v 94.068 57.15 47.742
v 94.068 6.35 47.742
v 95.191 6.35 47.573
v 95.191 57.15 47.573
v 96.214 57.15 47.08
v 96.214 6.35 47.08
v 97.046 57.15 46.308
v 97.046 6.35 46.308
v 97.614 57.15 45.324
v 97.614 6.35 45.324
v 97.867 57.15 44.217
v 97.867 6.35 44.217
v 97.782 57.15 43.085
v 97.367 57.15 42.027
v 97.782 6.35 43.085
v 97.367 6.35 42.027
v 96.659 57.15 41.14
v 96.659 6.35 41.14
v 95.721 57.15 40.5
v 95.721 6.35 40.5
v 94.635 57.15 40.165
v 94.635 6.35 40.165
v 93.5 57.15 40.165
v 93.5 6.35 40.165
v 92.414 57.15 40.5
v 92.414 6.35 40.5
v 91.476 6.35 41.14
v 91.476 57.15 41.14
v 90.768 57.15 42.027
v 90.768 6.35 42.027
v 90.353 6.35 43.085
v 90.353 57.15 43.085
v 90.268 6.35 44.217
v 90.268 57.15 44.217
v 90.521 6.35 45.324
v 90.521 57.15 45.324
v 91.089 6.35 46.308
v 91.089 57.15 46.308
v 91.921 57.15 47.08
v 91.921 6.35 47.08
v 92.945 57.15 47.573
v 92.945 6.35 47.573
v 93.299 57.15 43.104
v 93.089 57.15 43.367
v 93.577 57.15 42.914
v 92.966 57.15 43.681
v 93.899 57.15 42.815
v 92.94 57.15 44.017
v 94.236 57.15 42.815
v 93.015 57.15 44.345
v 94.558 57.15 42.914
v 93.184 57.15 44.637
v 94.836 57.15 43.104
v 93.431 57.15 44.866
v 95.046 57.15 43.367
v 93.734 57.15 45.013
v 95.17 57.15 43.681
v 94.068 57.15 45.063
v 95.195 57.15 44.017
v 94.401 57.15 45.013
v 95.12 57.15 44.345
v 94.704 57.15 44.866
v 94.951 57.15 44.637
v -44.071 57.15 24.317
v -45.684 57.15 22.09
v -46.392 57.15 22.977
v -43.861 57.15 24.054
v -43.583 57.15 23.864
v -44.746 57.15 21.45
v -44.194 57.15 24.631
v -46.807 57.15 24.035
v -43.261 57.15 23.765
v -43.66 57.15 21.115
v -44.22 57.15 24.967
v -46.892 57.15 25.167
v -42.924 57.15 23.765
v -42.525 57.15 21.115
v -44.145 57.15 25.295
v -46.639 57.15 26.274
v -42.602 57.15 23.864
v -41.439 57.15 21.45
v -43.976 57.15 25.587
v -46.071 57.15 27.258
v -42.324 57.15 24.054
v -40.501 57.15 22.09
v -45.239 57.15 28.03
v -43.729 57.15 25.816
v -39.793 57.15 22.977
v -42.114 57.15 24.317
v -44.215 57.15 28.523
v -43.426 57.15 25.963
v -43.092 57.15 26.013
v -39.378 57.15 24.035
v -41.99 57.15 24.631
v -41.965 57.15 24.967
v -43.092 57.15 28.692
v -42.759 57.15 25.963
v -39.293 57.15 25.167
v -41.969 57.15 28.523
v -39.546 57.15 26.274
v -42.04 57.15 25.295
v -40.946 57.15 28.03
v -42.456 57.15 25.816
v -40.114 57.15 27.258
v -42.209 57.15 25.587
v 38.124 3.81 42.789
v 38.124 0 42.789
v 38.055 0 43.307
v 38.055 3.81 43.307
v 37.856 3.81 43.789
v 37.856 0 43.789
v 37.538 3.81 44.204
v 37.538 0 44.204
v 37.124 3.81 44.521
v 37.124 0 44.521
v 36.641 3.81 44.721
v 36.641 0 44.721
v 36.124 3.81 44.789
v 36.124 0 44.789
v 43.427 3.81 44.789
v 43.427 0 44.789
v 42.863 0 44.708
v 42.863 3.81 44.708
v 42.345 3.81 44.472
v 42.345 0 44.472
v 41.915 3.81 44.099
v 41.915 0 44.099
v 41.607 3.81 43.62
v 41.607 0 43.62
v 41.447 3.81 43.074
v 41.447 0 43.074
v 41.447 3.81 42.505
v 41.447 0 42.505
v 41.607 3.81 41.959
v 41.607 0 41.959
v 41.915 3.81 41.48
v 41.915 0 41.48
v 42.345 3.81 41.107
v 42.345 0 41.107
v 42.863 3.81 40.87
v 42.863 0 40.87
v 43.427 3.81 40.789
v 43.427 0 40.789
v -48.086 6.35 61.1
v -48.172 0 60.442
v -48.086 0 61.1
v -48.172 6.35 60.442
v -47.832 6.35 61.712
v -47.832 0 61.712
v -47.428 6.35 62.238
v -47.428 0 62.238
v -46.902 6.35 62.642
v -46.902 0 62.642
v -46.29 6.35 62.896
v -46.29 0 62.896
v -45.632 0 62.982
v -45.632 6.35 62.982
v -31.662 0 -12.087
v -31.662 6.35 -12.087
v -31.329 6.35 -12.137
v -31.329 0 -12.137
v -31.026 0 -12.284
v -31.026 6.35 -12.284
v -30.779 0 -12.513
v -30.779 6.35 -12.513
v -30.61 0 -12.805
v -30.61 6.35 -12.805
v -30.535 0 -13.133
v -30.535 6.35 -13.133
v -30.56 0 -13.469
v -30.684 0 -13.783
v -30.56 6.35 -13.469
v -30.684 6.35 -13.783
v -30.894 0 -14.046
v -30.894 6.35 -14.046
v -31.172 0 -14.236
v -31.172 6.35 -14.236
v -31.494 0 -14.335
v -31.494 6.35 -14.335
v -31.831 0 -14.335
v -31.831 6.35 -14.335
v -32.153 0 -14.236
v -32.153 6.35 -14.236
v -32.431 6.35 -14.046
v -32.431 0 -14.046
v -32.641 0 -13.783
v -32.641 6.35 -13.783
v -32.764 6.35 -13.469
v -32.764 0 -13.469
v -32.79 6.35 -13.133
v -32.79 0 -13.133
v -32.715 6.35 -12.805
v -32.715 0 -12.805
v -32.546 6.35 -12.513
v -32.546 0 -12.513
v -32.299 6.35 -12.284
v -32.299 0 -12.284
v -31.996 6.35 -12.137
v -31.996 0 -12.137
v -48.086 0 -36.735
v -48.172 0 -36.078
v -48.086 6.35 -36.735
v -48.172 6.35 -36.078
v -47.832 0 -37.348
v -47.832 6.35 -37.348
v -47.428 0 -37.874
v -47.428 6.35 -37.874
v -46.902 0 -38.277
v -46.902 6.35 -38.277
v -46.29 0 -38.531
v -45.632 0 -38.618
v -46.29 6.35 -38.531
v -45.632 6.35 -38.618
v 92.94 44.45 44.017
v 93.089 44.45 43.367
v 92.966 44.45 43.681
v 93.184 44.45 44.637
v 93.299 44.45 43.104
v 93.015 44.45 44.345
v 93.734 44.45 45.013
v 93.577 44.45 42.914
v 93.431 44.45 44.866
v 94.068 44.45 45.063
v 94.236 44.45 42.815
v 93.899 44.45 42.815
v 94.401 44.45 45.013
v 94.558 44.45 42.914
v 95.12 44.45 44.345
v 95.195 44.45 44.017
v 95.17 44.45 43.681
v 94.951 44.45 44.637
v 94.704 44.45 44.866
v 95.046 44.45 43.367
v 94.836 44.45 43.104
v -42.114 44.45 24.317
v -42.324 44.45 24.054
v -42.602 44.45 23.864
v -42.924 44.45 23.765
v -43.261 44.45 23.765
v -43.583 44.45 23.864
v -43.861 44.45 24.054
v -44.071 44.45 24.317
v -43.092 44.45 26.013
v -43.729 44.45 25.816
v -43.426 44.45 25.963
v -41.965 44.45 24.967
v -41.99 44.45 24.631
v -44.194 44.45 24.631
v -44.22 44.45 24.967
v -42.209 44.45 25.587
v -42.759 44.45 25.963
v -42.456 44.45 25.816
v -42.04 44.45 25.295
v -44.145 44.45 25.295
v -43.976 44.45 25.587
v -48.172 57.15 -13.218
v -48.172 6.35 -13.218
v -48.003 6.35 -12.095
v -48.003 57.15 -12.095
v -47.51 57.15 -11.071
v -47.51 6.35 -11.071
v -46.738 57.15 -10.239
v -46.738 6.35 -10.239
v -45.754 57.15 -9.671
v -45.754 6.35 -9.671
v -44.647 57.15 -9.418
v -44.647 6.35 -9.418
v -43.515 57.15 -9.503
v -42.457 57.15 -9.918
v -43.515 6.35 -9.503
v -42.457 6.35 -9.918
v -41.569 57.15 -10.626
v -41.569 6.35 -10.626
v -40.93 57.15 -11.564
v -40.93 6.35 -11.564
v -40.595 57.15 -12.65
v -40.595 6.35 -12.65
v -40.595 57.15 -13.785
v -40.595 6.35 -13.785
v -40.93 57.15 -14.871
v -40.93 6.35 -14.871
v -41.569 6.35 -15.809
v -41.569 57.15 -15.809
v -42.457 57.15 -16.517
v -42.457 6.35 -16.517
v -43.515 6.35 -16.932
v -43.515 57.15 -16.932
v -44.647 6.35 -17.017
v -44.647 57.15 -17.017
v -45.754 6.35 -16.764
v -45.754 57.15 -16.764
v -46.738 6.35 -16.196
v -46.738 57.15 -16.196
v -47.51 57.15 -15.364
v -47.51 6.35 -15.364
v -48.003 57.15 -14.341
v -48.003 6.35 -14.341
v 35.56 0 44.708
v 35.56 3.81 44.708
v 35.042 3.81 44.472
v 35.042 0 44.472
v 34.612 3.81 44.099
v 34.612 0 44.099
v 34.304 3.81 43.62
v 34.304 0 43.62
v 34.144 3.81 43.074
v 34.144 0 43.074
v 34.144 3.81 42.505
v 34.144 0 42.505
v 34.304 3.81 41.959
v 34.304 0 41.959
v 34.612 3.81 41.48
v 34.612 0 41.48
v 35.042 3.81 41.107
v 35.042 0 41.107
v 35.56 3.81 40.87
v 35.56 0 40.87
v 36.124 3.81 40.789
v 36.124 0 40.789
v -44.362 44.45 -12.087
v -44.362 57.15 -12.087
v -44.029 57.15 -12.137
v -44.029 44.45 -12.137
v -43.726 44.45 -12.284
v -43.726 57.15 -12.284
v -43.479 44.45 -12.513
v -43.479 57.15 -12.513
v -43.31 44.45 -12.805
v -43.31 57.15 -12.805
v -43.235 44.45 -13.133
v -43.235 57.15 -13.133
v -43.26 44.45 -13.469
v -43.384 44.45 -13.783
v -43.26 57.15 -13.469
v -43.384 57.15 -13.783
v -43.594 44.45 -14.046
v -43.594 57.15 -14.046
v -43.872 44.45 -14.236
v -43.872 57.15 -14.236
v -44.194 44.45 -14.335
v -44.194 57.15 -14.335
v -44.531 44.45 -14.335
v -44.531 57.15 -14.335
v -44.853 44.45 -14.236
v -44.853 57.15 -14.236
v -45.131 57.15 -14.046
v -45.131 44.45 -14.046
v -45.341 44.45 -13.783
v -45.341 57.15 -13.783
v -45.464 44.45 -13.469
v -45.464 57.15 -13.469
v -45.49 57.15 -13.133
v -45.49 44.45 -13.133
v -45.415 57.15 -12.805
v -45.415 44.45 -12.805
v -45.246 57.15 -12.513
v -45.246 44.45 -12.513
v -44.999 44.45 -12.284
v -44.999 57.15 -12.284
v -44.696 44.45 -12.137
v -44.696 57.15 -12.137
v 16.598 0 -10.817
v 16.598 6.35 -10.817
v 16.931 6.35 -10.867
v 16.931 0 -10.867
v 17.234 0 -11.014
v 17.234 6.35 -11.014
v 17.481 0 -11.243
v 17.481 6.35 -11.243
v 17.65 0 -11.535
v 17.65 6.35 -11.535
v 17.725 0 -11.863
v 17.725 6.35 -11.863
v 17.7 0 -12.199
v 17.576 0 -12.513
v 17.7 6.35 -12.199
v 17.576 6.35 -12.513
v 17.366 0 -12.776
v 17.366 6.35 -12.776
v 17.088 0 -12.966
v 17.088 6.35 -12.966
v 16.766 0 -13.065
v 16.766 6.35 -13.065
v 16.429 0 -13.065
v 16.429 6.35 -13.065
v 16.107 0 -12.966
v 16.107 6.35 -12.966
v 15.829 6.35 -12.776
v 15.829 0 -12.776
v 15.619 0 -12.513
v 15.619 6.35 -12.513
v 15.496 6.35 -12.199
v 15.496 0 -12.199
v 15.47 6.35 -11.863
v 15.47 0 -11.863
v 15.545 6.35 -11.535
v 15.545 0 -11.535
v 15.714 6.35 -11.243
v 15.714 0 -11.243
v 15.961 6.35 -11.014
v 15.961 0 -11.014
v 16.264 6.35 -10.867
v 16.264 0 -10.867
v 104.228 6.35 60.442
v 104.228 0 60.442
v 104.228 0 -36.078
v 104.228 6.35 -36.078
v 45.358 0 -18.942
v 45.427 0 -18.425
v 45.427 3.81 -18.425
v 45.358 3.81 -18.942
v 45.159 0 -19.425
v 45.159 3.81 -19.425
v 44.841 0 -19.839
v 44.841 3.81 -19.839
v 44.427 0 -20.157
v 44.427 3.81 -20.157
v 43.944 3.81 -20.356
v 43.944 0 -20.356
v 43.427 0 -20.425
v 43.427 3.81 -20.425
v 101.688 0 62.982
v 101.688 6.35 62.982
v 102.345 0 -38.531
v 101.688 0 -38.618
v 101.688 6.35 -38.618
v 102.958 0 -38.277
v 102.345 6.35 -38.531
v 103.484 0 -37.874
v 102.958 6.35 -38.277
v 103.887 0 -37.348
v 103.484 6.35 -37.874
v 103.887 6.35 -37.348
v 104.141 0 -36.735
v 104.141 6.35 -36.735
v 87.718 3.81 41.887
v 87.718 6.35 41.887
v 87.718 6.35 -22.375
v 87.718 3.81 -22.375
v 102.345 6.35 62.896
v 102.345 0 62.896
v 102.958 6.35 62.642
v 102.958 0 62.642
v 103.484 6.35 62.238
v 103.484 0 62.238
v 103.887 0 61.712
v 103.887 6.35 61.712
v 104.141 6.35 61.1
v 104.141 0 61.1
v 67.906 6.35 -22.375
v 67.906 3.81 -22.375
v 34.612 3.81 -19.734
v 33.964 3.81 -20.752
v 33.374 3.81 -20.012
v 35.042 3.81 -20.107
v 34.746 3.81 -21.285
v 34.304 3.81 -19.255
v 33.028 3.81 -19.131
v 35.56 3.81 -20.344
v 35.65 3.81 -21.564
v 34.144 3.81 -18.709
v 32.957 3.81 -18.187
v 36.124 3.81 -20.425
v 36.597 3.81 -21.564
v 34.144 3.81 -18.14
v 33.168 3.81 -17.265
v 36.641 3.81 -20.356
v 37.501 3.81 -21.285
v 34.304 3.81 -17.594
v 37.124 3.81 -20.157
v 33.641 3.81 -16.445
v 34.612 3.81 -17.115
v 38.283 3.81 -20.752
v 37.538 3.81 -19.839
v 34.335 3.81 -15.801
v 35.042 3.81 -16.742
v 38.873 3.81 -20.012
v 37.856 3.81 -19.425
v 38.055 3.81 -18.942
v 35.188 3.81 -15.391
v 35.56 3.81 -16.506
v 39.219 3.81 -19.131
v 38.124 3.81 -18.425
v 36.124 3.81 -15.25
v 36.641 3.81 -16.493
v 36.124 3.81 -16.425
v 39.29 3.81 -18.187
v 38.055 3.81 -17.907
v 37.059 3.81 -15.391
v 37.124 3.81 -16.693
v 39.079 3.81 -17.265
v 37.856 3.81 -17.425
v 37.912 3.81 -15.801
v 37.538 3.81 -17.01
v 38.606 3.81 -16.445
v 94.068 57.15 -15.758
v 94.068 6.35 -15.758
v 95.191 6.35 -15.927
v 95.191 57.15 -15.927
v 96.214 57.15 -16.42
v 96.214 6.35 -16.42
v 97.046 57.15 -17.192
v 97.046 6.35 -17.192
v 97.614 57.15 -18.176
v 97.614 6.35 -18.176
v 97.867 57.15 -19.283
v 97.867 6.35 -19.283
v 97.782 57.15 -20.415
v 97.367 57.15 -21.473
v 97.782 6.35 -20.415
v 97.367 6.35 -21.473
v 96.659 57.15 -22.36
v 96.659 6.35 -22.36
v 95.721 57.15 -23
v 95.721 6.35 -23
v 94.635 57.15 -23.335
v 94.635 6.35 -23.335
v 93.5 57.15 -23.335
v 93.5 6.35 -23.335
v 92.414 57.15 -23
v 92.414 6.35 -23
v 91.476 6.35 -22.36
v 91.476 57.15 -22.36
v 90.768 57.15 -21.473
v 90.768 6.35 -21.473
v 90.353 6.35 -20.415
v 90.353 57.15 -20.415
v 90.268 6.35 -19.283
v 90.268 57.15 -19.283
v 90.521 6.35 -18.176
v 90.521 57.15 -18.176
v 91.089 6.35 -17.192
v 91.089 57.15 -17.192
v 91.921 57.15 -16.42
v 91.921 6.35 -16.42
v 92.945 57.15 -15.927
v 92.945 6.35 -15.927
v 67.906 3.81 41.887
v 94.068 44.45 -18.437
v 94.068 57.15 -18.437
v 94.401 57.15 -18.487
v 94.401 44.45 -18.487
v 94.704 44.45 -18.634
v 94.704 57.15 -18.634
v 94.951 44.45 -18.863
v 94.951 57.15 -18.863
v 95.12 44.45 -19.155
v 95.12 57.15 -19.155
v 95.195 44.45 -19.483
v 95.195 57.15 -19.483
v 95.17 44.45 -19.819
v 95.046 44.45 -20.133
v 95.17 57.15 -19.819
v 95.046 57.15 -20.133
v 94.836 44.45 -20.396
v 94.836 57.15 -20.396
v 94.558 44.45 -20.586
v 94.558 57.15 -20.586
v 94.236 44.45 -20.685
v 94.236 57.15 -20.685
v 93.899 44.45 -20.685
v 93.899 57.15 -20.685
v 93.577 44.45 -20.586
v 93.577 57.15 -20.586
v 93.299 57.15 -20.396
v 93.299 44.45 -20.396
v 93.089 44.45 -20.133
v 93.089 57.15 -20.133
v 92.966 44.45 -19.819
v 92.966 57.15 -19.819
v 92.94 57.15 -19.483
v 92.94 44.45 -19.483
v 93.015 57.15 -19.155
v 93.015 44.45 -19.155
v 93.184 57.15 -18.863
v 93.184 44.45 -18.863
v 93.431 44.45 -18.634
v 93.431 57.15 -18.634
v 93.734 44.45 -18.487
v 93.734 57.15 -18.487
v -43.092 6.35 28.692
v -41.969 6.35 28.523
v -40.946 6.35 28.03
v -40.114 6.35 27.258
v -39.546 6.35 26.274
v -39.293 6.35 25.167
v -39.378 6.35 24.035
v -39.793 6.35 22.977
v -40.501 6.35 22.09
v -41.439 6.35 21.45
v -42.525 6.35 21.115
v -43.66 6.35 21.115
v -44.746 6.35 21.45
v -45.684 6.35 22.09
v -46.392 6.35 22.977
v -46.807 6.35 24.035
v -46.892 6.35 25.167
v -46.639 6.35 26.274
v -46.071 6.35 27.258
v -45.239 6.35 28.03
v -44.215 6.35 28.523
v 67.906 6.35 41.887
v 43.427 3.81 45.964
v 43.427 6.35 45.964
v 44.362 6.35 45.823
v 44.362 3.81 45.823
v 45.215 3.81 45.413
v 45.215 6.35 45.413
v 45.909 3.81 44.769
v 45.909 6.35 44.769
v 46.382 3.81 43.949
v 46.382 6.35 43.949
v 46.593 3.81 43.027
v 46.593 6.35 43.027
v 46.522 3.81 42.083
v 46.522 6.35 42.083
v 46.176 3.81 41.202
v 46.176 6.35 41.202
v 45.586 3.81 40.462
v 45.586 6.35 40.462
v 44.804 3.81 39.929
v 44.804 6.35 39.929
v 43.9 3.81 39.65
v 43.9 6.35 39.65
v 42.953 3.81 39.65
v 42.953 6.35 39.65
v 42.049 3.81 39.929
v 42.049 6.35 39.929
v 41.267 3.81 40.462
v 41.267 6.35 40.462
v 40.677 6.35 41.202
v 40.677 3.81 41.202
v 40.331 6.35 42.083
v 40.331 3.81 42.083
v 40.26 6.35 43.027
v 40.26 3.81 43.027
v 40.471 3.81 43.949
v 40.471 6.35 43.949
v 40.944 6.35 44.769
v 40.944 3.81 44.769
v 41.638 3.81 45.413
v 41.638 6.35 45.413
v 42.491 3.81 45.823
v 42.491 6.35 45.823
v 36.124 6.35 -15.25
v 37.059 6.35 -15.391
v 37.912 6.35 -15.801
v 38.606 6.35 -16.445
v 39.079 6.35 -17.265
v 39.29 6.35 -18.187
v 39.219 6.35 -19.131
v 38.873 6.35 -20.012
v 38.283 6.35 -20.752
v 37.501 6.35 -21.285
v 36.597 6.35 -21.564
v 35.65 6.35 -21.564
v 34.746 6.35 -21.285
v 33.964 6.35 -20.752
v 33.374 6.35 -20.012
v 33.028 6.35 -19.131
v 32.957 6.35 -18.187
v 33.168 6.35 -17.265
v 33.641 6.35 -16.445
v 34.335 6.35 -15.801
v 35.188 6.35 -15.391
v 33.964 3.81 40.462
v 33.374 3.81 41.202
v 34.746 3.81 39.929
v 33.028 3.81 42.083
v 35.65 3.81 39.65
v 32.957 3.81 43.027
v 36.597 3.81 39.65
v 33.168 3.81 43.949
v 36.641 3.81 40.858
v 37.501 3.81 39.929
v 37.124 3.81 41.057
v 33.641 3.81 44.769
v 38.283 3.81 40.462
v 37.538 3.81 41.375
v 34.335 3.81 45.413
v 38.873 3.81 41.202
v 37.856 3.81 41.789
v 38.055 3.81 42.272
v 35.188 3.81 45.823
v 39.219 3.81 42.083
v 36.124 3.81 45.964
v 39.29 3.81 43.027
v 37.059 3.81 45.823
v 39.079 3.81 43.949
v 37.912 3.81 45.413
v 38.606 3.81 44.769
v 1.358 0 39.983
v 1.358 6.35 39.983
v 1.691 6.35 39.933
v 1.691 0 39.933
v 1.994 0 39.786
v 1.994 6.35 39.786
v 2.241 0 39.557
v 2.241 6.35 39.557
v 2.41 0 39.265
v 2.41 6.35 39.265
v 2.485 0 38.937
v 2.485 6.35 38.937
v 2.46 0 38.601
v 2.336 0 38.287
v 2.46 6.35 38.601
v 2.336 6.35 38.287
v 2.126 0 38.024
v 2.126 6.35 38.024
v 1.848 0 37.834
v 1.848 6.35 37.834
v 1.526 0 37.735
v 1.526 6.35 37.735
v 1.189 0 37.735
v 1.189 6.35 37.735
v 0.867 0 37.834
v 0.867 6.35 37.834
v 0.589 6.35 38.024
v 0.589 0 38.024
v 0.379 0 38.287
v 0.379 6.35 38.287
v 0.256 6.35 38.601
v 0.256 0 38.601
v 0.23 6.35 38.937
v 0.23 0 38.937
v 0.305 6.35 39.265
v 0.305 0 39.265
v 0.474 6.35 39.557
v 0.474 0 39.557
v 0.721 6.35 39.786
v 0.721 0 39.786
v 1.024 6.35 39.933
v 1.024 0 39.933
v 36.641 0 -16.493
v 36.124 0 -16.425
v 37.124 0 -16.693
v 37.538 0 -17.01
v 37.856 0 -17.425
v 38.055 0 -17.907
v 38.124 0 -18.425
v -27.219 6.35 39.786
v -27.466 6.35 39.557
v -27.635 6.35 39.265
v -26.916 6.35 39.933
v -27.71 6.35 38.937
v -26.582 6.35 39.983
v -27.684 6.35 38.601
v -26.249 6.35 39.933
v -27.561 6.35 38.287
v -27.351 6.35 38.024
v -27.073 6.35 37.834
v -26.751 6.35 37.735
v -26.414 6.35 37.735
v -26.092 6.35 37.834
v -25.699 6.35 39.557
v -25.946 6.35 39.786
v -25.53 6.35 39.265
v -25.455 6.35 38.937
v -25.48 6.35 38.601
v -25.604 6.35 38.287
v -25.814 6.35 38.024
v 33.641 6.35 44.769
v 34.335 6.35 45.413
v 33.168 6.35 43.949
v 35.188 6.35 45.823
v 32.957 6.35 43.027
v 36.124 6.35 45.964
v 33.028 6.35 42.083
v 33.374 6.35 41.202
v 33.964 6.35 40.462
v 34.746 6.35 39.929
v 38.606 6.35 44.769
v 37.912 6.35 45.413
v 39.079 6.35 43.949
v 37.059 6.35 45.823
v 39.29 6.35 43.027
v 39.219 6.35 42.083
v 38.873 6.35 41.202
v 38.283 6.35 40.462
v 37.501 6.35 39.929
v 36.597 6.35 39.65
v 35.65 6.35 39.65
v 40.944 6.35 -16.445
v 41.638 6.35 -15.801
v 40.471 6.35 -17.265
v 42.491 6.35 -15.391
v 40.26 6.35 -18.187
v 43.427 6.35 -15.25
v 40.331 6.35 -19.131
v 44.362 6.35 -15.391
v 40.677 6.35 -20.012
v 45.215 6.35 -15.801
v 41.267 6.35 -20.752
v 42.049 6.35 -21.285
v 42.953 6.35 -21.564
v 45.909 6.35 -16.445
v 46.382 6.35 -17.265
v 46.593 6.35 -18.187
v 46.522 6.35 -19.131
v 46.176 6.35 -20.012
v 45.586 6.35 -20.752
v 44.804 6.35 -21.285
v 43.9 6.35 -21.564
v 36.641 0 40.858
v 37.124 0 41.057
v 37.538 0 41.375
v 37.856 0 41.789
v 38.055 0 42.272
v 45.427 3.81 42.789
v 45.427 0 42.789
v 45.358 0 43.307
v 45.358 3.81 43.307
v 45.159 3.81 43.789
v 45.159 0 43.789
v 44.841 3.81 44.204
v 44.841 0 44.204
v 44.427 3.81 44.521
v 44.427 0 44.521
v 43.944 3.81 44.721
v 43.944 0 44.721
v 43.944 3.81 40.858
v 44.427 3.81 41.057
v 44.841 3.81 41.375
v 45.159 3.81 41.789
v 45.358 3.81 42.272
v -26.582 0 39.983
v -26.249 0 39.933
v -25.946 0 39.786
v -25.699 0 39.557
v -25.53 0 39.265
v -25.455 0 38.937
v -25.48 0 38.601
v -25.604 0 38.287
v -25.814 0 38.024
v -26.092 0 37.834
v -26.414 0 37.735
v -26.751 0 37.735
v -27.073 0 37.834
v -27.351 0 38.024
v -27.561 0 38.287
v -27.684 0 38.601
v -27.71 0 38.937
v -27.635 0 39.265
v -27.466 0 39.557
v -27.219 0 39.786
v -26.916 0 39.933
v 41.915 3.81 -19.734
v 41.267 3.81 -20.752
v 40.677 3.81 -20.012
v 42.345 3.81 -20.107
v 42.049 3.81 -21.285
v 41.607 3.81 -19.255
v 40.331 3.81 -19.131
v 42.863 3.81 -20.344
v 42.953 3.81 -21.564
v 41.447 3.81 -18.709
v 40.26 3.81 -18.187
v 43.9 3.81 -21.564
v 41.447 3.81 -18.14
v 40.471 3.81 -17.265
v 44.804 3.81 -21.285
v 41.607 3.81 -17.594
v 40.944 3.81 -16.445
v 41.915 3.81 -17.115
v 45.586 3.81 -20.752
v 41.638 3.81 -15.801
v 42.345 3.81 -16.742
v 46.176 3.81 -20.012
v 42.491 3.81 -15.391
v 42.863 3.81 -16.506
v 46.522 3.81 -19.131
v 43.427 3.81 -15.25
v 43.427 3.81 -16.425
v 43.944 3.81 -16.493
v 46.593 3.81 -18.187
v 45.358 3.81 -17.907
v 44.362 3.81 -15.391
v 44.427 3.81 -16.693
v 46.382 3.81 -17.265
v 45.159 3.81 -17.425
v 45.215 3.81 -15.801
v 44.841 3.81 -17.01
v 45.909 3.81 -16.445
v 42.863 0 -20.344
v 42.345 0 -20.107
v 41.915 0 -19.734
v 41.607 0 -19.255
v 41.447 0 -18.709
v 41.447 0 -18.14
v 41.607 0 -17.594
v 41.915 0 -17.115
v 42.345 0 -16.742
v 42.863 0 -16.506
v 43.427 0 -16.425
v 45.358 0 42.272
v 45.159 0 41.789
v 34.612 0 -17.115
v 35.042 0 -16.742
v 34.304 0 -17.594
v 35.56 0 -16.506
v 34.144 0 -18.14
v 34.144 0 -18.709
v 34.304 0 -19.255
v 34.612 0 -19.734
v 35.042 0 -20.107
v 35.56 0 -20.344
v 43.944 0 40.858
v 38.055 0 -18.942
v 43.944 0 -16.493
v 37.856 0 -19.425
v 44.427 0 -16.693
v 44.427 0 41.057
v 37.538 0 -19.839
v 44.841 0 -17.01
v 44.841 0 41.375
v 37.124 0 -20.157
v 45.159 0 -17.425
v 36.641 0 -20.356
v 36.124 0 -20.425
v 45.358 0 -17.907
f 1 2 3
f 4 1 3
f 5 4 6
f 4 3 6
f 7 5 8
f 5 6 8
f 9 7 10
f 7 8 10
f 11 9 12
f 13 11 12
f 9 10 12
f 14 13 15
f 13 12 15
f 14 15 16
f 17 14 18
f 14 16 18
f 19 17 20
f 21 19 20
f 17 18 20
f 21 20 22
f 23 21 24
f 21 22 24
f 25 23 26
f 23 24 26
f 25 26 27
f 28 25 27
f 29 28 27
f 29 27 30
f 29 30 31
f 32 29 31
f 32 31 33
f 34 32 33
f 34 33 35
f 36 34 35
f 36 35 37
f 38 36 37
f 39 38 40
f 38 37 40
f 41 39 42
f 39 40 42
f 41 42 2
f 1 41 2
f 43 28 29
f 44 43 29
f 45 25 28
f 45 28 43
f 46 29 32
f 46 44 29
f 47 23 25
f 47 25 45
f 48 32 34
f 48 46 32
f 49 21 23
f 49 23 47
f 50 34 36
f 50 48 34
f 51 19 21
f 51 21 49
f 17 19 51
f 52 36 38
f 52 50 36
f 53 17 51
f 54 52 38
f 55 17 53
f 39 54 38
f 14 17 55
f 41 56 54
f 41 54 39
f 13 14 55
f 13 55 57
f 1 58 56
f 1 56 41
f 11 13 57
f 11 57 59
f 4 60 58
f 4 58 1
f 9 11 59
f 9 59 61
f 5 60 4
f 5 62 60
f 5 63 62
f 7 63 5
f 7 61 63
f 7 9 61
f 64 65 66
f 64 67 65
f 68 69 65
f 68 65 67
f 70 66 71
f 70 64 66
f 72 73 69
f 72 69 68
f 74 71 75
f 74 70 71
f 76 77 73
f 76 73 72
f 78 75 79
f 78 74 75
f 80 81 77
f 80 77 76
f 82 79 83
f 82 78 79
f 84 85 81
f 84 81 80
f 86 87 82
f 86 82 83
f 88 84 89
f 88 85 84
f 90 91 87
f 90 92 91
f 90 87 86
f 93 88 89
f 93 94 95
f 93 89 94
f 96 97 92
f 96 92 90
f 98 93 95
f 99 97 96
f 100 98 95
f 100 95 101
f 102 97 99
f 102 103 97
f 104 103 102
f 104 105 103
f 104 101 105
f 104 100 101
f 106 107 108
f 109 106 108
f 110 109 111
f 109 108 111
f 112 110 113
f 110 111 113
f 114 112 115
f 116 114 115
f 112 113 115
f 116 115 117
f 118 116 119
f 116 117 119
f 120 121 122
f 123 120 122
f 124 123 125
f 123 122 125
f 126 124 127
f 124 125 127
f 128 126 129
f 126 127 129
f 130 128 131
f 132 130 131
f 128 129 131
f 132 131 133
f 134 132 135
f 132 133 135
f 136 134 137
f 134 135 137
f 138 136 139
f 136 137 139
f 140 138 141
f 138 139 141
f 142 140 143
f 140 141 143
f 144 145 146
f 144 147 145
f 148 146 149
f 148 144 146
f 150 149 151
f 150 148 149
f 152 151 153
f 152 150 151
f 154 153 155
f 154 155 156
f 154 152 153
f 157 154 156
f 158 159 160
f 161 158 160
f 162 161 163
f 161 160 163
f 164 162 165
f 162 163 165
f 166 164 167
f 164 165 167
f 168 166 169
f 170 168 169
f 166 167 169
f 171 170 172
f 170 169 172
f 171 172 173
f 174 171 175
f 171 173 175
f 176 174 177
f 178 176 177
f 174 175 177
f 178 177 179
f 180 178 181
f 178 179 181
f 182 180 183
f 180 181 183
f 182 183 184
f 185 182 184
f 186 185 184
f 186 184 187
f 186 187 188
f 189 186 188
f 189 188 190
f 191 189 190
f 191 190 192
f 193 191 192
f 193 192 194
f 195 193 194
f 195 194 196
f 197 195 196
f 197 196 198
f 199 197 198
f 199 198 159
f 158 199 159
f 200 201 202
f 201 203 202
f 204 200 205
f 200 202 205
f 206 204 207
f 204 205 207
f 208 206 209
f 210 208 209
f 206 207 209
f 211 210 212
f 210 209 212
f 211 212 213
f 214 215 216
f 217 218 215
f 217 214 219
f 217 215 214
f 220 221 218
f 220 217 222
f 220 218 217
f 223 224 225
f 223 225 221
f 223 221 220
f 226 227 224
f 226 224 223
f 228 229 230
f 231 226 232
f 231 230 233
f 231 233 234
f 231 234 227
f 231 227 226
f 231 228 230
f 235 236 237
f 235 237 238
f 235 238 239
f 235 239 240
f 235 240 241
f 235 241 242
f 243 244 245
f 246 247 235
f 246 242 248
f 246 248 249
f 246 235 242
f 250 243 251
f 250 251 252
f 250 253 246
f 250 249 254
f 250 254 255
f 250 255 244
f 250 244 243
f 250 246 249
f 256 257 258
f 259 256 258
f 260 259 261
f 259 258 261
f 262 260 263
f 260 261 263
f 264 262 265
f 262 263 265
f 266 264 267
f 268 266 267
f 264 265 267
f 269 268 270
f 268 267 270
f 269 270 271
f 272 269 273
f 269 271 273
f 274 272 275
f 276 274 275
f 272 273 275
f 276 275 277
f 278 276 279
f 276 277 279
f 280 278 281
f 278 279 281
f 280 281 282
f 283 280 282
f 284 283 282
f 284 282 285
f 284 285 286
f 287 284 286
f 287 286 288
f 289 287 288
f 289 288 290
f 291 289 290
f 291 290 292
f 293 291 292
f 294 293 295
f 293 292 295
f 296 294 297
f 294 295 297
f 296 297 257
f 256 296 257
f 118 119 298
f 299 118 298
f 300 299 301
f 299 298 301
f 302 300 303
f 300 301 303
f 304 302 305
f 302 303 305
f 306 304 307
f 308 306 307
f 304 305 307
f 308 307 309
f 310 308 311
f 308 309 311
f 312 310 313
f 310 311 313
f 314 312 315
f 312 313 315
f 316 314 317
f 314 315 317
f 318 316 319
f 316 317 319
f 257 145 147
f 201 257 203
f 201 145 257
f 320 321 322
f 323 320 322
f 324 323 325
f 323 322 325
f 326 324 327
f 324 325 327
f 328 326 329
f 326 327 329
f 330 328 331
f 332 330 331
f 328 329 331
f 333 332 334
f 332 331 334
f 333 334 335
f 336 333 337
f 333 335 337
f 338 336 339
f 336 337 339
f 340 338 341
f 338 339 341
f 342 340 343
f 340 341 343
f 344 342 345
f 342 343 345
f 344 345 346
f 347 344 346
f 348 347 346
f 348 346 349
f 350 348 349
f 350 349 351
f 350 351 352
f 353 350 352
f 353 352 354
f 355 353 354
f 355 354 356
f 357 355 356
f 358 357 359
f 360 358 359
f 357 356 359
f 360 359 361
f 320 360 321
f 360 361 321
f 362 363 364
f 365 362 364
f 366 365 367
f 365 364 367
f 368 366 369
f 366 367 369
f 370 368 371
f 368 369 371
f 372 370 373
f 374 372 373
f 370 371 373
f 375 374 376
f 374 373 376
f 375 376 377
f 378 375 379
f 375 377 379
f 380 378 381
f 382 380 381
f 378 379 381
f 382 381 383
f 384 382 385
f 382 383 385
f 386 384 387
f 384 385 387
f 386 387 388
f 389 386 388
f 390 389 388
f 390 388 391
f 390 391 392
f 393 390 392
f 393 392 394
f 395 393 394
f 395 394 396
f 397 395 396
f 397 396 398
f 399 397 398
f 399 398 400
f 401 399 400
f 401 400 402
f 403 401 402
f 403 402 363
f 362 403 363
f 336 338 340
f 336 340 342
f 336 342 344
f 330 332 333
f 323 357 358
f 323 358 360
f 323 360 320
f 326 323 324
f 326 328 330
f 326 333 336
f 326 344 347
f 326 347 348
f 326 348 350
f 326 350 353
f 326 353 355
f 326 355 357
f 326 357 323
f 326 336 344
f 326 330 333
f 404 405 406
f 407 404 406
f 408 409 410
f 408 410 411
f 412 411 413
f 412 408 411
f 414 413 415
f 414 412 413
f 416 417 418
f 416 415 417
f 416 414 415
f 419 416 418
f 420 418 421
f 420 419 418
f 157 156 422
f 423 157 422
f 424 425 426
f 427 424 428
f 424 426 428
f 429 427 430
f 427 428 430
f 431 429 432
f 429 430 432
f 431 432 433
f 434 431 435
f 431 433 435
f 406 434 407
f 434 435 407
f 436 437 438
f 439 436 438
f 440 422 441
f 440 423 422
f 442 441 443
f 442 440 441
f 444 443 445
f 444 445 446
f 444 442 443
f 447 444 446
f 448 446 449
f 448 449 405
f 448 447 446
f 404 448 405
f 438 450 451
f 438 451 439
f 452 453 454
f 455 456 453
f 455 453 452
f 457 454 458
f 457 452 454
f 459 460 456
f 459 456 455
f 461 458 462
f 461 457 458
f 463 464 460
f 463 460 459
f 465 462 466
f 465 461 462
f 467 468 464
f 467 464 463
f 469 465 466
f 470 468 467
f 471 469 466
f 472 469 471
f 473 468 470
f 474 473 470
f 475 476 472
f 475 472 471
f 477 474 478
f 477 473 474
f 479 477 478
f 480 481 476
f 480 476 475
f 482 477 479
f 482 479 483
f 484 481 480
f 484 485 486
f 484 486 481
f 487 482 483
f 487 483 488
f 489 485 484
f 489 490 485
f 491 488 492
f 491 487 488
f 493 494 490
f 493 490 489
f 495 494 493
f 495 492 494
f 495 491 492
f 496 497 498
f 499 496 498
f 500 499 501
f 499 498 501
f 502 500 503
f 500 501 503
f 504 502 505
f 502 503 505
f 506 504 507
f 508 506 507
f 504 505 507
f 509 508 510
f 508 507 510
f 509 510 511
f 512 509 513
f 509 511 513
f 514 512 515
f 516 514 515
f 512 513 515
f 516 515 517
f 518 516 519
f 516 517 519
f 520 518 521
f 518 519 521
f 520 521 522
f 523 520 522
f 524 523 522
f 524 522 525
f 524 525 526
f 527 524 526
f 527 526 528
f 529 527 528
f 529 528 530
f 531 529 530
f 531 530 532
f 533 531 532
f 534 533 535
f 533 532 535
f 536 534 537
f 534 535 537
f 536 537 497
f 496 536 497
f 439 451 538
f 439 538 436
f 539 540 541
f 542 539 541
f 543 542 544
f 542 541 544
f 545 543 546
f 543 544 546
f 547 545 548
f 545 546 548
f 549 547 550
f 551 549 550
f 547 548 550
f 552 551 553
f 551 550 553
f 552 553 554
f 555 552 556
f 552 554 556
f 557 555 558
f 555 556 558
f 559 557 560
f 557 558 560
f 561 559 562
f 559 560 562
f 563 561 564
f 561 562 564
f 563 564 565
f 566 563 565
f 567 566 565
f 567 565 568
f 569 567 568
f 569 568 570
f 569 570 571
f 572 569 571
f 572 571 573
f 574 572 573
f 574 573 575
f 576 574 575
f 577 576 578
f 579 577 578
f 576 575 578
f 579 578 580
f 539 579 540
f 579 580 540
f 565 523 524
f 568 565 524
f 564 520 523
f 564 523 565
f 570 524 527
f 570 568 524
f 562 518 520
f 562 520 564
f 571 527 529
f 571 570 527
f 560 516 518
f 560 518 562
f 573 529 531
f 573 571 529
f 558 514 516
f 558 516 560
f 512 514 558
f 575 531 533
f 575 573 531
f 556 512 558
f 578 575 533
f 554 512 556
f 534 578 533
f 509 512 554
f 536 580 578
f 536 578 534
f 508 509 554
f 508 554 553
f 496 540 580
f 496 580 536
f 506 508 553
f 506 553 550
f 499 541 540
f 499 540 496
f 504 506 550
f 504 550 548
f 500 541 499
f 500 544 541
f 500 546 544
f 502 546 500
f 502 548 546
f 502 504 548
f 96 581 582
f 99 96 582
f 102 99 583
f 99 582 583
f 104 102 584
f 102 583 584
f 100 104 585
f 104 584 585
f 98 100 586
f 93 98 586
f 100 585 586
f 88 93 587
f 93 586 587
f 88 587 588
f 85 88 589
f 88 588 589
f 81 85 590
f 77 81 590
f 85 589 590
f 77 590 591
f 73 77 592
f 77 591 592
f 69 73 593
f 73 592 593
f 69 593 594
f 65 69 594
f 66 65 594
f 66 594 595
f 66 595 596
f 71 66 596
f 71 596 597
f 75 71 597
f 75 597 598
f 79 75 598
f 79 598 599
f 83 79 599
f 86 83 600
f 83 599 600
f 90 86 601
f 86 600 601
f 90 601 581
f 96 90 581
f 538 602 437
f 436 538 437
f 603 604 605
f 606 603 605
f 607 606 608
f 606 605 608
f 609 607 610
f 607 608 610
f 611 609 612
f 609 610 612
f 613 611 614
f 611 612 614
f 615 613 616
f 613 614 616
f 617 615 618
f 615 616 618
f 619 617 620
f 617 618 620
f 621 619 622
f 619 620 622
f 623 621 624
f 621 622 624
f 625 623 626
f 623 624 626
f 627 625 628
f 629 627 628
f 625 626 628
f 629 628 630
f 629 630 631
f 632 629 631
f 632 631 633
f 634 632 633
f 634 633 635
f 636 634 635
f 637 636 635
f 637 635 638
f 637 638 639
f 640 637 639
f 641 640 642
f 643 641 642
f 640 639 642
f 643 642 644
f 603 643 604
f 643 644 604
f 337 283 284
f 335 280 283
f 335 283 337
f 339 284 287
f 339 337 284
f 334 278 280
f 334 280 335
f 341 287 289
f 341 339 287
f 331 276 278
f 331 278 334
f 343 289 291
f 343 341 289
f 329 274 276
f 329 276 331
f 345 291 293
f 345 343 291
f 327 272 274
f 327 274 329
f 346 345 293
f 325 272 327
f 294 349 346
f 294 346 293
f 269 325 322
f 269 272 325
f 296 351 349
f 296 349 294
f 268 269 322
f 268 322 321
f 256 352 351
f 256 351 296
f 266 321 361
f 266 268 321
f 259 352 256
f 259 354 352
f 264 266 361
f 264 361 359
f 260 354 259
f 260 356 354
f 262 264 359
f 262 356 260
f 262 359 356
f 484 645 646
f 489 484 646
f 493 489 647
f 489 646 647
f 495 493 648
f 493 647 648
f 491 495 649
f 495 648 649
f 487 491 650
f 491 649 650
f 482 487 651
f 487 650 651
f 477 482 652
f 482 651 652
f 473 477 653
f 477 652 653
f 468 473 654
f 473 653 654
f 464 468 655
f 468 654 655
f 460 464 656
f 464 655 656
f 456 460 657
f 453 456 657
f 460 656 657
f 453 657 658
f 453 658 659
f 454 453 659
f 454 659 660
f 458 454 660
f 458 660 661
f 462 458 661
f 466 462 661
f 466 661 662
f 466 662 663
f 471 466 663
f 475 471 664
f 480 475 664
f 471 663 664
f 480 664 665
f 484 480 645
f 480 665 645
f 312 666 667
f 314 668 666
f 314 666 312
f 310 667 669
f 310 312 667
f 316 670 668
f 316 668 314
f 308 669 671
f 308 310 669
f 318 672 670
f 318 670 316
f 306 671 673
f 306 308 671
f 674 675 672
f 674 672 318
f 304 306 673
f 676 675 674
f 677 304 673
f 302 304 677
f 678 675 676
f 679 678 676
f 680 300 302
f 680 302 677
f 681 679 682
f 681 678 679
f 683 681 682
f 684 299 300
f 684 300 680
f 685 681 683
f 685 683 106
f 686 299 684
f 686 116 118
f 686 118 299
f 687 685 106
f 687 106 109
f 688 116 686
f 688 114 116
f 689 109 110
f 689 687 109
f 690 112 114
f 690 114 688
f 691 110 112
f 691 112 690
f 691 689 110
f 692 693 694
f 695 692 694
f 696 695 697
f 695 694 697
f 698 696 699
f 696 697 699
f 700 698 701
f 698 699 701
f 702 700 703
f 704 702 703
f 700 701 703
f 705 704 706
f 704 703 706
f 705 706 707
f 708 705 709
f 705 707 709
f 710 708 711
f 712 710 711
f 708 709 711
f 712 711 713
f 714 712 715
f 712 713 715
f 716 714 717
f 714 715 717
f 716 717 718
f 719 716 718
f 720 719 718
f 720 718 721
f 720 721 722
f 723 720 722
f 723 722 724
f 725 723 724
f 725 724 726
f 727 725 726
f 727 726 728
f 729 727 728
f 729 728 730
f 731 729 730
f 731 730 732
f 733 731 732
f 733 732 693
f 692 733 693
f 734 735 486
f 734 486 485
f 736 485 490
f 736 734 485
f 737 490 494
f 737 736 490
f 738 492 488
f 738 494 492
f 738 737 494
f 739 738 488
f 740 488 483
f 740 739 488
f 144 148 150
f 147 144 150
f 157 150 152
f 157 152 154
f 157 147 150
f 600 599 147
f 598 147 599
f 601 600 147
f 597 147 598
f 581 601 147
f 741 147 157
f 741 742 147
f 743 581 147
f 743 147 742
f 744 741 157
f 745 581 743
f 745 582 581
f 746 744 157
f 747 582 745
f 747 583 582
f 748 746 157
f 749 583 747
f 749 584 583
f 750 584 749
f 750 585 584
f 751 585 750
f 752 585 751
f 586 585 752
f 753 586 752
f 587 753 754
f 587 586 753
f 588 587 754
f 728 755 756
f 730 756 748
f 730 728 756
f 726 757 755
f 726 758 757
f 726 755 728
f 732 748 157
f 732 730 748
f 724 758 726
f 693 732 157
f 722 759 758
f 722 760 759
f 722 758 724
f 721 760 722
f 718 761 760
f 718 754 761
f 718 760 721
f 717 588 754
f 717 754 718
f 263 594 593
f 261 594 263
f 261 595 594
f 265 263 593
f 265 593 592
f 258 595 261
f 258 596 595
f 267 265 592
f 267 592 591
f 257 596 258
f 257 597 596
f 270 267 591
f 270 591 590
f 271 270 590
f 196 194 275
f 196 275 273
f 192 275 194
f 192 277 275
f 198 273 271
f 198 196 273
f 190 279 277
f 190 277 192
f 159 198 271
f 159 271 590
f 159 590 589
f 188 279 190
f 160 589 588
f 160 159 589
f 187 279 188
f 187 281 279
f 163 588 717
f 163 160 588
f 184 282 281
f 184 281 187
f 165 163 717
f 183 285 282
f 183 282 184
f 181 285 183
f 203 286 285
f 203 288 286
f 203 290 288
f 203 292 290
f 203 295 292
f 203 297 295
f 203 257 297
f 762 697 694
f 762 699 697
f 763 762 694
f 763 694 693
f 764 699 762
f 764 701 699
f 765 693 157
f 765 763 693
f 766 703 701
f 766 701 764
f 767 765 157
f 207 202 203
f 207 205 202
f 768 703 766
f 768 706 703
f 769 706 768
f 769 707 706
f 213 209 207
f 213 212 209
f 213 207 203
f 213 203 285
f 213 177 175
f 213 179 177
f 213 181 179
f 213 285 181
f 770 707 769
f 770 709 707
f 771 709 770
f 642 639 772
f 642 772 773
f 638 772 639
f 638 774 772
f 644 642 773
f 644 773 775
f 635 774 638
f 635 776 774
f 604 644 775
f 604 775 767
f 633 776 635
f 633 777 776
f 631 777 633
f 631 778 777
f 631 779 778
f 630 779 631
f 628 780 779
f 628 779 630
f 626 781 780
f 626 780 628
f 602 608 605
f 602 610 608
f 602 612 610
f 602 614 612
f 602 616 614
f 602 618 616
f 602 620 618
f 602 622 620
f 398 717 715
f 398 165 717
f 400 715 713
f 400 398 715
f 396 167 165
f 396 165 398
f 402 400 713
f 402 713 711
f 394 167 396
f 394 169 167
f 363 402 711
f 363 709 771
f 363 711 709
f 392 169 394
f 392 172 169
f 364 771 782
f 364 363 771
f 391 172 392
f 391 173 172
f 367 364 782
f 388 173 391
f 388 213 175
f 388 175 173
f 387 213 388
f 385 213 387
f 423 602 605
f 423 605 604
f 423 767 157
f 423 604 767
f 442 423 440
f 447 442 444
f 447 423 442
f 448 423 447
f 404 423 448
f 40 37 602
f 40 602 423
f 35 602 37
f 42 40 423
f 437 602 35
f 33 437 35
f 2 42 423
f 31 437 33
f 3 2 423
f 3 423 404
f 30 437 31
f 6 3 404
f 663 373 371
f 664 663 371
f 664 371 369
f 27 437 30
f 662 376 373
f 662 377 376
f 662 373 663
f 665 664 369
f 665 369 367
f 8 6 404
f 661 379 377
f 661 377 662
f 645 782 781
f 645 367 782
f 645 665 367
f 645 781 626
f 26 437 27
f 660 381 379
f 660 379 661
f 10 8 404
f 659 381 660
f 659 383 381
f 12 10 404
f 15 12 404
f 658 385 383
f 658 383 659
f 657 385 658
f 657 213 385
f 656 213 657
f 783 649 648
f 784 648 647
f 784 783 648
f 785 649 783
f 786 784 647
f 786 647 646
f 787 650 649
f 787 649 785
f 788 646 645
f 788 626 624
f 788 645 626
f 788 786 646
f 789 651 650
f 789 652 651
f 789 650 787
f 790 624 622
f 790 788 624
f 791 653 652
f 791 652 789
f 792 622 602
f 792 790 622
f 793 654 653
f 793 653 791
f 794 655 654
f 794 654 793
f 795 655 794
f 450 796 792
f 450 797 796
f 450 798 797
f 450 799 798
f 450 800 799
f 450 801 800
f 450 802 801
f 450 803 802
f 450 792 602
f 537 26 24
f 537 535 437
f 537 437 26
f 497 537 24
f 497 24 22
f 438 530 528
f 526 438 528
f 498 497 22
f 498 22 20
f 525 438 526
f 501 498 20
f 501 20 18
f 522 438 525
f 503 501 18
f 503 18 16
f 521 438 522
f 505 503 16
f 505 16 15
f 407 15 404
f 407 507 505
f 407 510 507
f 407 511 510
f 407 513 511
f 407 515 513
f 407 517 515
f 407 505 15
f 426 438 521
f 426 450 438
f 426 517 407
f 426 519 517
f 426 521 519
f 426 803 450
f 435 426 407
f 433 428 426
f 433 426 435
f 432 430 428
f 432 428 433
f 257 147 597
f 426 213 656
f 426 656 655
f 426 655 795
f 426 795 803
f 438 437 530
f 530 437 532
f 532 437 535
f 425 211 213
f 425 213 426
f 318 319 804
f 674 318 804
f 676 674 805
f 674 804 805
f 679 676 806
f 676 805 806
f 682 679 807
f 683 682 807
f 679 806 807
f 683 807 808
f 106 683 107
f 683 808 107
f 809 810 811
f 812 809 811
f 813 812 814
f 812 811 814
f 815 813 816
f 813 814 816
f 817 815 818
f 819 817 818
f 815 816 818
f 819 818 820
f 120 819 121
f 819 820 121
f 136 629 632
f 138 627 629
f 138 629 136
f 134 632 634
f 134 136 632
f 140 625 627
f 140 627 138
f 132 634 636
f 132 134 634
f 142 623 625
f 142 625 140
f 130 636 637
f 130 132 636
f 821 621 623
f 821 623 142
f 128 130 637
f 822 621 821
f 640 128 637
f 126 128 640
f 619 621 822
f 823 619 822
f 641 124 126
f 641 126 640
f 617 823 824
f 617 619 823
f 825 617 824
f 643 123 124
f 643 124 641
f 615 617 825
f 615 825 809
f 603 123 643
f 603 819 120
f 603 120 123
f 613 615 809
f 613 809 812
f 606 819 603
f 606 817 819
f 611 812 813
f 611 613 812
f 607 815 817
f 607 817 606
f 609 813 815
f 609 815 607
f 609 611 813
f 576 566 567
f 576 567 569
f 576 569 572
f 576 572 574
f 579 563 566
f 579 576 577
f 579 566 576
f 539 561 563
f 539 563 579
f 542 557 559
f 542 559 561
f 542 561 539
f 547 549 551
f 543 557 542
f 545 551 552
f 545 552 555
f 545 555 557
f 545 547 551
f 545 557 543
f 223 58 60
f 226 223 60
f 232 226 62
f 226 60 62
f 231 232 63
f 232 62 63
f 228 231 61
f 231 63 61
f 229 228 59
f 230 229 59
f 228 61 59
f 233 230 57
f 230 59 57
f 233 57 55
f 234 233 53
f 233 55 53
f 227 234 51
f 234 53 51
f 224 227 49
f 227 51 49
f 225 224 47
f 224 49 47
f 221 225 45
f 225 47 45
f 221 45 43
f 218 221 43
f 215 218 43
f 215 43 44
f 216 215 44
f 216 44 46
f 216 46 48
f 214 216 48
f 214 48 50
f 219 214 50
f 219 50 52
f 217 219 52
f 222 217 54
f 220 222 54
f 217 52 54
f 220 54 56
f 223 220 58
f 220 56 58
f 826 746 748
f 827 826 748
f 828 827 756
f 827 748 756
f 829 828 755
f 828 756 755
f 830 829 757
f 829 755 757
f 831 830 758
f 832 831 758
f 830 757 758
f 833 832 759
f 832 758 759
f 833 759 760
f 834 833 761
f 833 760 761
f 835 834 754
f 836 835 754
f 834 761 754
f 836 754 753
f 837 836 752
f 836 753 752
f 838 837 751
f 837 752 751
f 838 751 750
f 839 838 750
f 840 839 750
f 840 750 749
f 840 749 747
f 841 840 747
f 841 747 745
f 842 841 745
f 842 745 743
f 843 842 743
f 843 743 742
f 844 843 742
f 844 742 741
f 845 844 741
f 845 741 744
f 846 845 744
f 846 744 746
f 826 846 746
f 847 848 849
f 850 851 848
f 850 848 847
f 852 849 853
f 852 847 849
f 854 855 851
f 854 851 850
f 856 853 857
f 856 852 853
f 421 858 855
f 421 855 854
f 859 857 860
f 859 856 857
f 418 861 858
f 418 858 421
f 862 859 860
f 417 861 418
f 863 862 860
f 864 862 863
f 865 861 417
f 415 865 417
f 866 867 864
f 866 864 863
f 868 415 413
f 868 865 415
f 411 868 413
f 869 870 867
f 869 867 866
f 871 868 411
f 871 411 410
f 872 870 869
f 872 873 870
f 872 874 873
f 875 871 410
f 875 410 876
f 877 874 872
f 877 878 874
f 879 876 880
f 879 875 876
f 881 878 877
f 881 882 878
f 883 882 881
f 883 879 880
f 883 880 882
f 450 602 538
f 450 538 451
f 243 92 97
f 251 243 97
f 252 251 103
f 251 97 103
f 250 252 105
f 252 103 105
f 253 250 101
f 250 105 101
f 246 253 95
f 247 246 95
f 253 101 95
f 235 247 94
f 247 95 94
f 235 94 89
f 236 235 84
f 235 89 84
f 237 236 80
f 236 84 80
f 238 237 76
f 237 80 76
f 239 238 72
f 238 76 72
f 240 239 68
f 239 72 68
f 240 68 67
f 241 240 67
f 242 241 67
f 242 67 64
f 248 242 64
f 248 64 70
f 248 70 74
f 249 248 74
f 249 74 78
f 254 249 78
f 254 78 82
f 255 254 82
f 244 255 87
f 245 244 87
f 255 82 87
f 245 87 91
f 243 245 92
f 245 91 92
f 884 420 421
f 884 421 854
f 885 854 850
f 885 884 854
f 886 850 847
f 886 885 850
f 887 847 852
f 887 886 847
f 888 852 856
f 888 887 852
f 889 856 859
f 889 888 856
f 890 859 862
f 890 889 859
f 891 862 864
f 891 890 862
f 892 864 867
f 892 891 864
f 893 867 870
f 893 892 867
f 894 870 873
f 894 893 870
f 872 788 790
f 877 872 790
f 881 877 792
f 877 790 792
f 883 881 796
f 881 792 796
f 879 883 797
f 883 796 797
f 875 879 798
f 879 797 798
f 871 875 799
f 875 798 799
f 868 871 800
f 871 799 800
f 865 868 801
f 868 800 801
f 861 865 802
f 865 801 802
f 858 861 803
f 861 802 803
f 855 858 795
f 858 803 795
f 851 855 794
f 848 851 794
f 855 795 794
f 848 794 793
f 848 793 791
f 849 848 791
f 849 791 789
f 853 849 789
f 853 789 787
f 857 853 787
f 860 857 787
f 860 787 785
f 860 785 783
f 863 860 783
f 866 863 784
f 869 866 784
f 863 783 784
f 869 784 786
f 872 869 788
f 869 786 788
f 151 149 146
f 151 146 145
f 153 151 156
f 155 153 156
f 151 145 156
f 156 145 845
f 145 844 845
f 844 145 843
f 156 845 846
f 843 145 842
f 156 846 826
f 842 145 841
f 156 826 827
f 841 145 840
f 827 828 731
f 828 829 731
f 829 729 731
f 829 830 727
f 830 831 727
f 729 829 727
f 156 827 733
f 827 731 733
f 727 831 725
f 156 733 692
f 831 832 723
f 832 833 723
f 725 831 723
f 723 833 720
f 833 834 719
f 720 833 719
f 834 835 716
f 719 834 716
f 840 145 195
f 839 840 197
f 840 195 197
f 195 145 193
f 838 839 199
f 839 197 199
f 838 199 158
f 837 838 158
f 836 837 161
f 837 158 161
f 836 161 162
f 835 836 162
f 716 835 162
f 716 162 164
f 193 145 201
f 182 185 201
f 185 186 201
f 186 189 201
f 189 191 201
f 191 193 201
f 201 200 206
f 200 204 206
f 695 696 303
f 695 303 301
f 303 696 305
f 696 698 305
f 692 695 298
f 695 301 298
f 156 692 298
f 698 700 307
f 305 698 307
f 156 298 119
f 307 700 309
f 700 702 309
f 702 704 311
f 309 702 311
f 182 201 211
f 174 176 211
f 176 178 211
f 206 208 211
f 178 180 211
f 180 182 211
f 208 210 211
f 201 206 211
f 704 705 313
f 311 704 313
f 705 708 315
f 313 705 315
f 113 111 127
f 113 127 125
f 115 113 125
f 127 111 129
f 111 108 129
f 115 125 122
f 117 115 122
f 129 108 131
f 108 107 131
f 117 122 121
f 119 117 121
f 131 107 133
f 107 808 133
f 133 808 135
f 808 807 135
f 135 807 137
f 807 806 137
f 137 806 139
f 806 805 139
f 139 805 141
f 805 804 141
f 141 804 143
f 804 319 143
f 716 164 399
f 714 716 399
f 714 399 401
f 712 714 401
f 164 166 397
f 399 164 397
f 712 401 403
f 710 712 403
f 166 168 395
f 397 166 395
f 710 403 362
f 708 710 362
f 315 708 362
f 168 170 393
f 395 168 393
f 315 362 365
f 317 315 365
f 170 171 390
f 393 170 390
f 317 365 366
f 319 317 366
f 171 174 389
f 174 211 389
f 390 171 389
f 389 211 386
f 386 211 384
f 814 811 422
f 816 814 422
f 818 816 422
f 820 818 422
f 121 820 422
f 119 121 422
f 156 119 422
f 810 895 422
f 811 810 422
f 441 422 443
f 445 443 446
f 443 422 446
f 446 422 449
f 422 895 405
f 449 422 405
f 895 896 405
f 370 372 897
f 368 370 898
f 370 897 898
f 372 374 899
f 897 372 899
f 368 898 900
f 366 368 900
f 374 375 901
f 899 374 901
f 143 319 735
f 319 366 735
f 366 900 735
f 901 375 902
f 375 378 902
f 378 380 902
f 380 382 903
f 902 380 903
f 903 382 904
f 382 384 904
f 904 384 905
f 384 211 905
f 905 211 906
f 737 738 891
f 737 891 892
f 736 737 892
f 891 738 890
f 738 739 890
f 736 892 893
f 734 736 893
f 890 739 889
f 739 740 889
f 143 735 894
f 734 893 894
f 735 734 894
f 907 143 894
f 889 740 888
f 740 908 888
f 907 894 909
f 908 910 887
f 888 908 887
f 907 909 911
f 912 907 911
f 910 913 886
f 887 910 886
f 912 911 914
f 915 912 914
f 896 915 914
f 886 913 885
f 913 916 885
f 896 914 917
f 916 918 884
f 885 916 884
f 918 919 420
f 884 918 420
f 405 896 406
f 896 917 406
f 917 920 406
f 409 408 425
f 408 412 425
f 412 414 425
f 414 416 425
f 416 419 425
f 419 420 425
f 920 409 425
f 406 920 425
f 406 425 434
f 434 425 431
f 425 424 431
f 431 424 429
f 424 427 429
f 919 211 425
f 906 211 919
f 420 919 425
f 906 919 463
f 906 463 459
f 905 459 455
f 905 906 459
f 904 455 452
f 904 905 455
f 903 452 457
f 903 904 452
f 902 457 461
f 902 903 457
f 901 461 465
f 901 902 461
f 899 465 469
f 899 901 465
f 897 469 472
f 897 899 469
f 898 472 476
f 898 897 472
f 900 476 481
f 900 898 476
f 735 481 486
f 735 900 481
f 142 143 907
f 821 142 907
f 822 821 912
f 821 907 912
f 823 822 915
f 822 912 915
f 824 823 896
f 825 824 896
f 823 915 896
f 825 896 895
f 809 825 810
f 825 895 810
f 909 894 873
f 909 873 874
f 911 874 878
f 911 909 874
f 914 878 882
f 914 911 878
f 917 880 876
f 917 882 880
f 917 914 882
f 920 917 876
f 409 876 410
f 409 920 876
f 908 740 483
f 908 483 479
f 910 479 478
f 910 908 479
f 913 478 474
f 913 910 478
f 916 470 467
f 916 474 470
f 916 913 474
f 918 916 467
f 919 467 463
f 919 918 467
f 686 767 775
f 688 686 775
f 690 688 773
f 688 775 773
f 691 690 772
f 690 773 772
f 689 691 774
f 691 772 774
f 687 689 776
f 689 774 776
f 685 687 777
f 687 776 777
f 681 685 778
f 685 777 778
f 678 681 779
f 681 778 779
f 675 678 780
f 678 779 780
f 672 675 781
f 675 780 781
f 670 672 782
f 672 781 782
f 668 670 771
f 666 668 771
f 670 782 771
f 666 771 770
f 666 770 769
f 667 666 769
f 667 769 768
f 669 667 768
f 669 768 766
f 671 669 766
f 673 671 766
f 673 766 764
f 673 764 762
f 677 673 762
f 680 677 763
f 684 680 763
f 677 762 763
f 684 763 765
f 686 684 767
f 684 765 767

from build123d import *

# Parameters (mm, degrees)
SKETCH1_W           = 152.4
SKETCH1_H           = 101.6
BOSS_EXTRUDE1_DEPTH = 6.35
SKETCH2_R           = 3.81
BOSS_EXTRUDE2_DEPTH = 50.8
SKETCH3_R           = 1.1303
CUT_EXTRUDE2_DEPTH  = 12.7
CUT_EXTRUDE3_DEPTH  = 6.35
SKETCH6_W           = 30.413113892
SKETCH6_H           = 50.8
BOSS_EXTRUDE3_DEPTH = 25.4
SKETCH8_W           = 30.413113892
SKETCH8_H           = 50.8
CUT_EXTRUDE4_DEPTH  = 25.4
SKETCH9_R           = 3.175
CUT_EXTRUDE5_DEPTH  = 2.54
SKETCH10_W          = 19.812
SKETCH10_H          = 64.262
CUT_EXTRUDE6_DEPTH  = 2.54
SKETCH12_R          = 1.1303
CUT_EXTRUDE7_DEPTH  = 132.950059198
FILLET1_R           = 2.54


with BuildPart() as part:
    # Sketch1 → Boss-Extrude1 (new body)
    with BuildSketch(Plane(origin=(0, 0, 0), x_dir=(1, 0, 0), z_dir=(0, 1, 0))):
        with Locations((28.027586207, -12.182445141)):
            Rectangle(SKETCH1_W, SKETCH1_H)
    extrude(amount=BOSS_EXTRUDE1_DEPTH)

    # Sketch2 → Boss-Extrude2 (add)
    with BuildSketch(Plane(origin=(0, 6.35, 0), x_dir=(1, 0, 0), z_dir=(0, 1, 0))):
        with Locations(Location((-44.362413793, 13.217554859, 0), (0, 0, 180))):
            Circle(SKETCH2_R)
        with Locations(Location((-43.092413793, -24.882445141, 0), (0, 0, 270))):
            Circle(SKETCH2_R)
        with Locations(Location((94.067586207, 19.567554859, 0), (0, 0, 270))):
            Circle(SKETCH2_R)
        with Locations(Location((94.067586207, -43.932445141, 0), (0, 0, 270))):
            Circle(SKETCH2_R)
    extrude(amount=BOSS_EXTRUDE2_DEPTH)

    # Sketch3 → Cut-Extrude2 (cut)
    with BuildSketch(Plane(origin=(0, 57.15, 0), x_dir=(1, 0, 0), z_dir=(0, 1, 0))):
        with Locations(Location((-44.362413793, 13.217554859, 0), (0, 0, 270))):
            Circle(SKETCH3_R)
        with Locations(Location((94.067586207, -43.932445141, 0), (0, 0, 270))):
            Circle(SKETCH3_R)
        with Locations(Location((94.067586207, 19.567554859, 0), (0, 0, 270))):
            Circle(SKETCH3_R)
        with Locations(Location((-43.092413793, -24.882445141, 0), (0, 0, 270))):
            Circle(SKETCH3_R)
    extrude(amount=-CUT_EXTRUDE2_DEPTH, mode=Mode.SUBTRACT)

    # Sketch4 → Cut-Extrude3 (cut)
    with BuildSketch(Plane.XZ):
        with BuildLine():
            ThreePointArc((38.123586207, 42.789445141), (37.537799769, 44.203658703), (36.123586207, 44.789445141))
            Line((36.123586207, 44.789445141), (36.123586207, 42.789445141))
            Line((36.123586207, 42.789445141), (36.123586207, 40.789445141))
            ThreePointArc((36.123586207, 40.789445141), (37.537799769, 41.375231579), (38.123586207, 42.789445141))
        make_face()
        with BuildLine():
            Line((36.123586207, 42.789445141), (36.123586207, 44.789445141))
            ThreePointArc((36.123586207, 44.789445141), (34.123586207, 42.789445141), (36.123586207, 40.789445141))
            Line((36.123586207, 40.789445141), (36.123586207, 42.789445141))
        make_face()
        with BuildLine():
            ThreePointArc((38.123586207, 42.789445141), (37.537799769, 44.203658703), (36.123586207, 44.789445141))
            Line((36.123586207, 44.789445141), (36.123586207, 42.789445141))
            Line((36.123586207, 42.789445141), (36.123586207, 40.789445141))
            ThreePointArc((36.123586207, 40.789445141), (37.537799769, 41.375231579), (38.123586207, 42.789445141))
        make_face()
        with BuildLine():
            Line((36.123586207, 42.789445141), (36.123586207, 44.789445141))
            ThreePointArc((36.123586207, 44.789445141), (34.123586207, 42.789445141), (36.123586207, 40.789445141))
            Line((36.123586207, 40.789445141), (36.123586207, 42.789445141))
        make_face()
        with BuildLine():
            ThreePointArc((45.426586207, 42.789445141), (44.840799769, 44.203658703), (43.426586207, 44.789445141))
            Line((43.426586207, 44.789445141), (43.426586207, 42.789445141))
            Line((43.426586207, 42.789445141), (43.426586207, 40.789445141))
            ThreePointArc((43.426586207, 40.789445141), (44.840799769, 41.375231579), (45.426586207, 42.789445141))
        make_face()
        with BuildLine():
            Line((43.426586207, 42.789445141), (43.426586207, 44.789445141))
            ThreePointArc((43.426586207, 44.789445141), (41.426586207, 42.789445141), (43.426586207, 40.789445141))
            Line((43.426586207, 40.789445141), (43.426586207, 42.789445141))
        make_face()
        with BuildLine():
            ThreePointArc((45.426586207, 42.789445141), (44.840799769, 44.203658703), (43.426586207, 44.789445141))
            Line((43.426586207, 44.789445141), (43.426586207, 42.789445141))
            Line((43.426586207, 42.789445141), (43.426586207, 40.789445141))
            ThreePointArc((43.426586207, 40.789445141), (44.840799769, 41.375231579), (45.426586207, 42.789445141))
        make_face()
        with BuildLine():
            Line((43.426586207, 42.789445141), (43.426586207, 44.789445141))
            ThreePointArc((43.426586207, 44.789445141), (41.426586207, 42.789445141), (43.426586207, 40.789445141))
            Line((43.426586207, 40.789445141), (43.426586207, 42.789445141))
        make_face()
    cut_extrude3 = extrude(amount=-CUT_EXTRUDE3_DEPTH, mode=Mode.SUBTRACT)

    # Sketch6 → Boss-Extrude3 (add)
    with BuildSketch(Plane(origin=(0, 6.35, 0), x_dir=(1, 0, 0), z_dir=(0, 1, 0))):
        with Locations((33.36893454, 13.217554859)):
            Rectangle(SKETCH6_W, SKETCH6_H)
    extrude(amount=BOSS_EXTRUDE3_DEPTH)

    # Mirror1: Cut-Extrude3 across plane
    add(cut_extrude3.mirror(Plane(origin=(48.575491486, 31.75, 12.182445141), x_dir=(1, 0, 0), z_dir=(0, 0, -1))), mode=Mode.SUBTRACT)

    # Sketch8 → Cut-Extrude4 (cut)
    with BuildSketch(Plane(origin=(0, 31.75, 0), x_dir=(1, 0, 0), z_dir=(0, 1, 0))):
        with Locations((33.36893454, 13.217554859)):
            Rectangle(SKETCH8_W, SKETCH8_H)
    extrude(amount=-CUT_EXTRUDE4_DEPTH, mode=Mode.SUBTRACT)

    # Sketch9 → Cut-Extrude5 (cut)
    with BuildSketch(Plane(origin=(0, 6.35, 0), x_dir=(1, 0, 0), z_dir=(0, 1, 0))):
        with Locations(Location((43.426586207, 18.424554859, 0), (0, 0, 270))):
            Circle(SKETCH9_R)
        with Locations(Location((36.123586207, 18.424554859, 0), (0, 0, 270))):
            Circle(SKETCH9_R)
        with Locations(Location((43.426586207, -42.789445141, 0), (0, 0, 270))):
            Circle(SKETCH9_R)
        with Locations(Location((36.123586207, -42.789445141, 0), (0, 0, 270))):
            Circle(SKETCH9_R)
    extrude(amount=-CUT_EXTRUDE5_DEPTH, mode=Mode.SUBTRACT)

    # Sketch10 → Cut-Extrude6 (cut)
    with BuildSketch(Plane(origin=(0, 6.35, 0), x_dir=(1, 0, 0), z_dir=(0, 1, 0))):
        with Locations((77.811586207, -9.756234071)):
            Rectangle(SKETCH10_W, SKETCH10_H)
    extrude(amount=-CUT_EXTRUDE6_DEPTH, mode=Mode.SUBTRACT)

    # Sketch12 → Cut-Extrude7 (cut, through all)
    with BuildSketch(Plane(origin=(0, 6.35, 0), x_dir=(1, 0, 0), z_dir=(0, 1, 0))):
        with Locations(Location((-31.662413793, 13.217554859, 0), (0, 0, 270))):
            Circle(SKETCH12_R)
        with Locations(Location((16.597586207, 11.947554859, 0), (0, 0, 270))):
            Circle(SKETCH12_R)
        with Locations(Location((1.357586207, -38.852445141, 0), (0, 0, 270))):
            Circle(SKETCH12_R)
        with Locations(Location((-26.582413793, -38.852445141, 0), (0, 0, 270))):
            Circle(SKETCH12_R)
    extrude(amount=-CUT_EXTRUDE7_DEPTH, mode=Mode.SUBTRACT)

    # Fillet1
    fillet1_edges = [part.edges().sort_by_distance(p)[0] for p in [
        (-48.172413793, 3.175, -38.617554859),
        (104.227586207, 3.175, -38.617554859),
        (104.227586207, 3.175, 62.982445141),
        (-48.172413793, 3.175, 62.982445141),
    ]]
    fillet(fillet1_edges, radius=FILLET1_R)


solid = part.part
